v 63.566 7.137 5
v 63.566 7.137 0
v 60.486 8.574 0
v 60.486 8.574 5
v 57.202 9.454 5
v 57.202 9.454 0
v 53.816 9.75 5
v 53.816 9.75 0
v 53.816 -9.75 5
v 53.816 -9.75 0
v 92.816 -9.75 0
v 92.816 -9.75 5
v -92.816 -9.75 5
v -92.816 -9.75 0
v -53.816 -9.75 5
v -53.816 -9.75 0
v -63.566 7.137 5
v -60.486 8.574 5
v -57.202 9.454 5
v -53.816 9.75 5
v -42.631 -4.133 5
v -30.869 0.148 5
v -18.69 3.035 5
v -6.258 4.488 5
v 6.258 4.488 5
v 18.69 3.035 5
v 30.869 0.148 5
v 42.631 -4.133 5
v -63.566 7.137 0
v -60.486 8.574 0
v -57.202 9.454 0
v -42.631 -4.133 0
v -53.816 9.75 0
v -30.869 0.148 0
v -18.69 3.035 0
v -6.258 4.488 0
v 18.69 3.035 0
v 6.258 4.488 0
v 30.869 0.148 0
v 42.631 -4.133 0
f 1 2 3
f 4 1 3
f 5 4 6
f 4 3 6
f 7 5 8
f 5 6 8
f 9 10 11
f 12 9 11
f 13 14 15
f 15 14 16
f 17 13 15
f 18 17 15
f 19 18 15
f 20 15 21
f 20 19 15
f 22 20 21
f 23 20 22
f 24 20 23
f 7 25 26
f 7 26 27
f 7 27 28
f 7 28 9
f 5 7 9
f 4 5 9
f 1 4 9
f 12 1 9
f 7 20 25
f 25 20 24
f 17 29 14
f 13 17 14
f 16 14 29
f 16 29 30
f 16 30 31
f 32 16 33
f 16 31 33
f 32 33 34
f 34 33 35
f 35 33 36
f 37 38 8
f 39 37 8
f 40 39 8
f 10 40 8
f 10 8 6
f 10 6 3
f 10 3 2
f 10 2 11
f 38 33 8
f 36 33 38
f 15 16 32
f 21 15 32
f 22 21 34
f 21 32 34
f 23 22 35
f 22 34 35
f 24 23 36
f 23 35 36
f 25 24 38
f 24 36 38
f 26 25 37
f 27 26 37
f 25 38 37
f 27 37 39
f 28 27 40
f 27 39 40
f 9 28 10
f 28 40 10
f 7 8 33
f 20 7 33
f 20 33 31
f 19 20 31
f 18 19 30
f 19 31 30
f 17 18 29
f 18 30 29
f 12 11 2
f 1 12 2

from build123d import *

# Parameters (mm, degrees)
F1_DEPTH = 5


with BuildPart() as f1:
    # F0 (on Top) → F1 (new body)
    with BuildSketch(Plane.XY):
        Polygon((-92.8162193303, -9.75), (-53.8162193302, -9.75), (-63.5662193303, 7.1374953738), align=None)
        with BuildLine():
            Line((-63.5662193303, 7.1374953738), (-53.8162193303, -9.75))
            Line((-53.8162193303, -9.75), (-53.8162193303, 9.75))
            ThreePointArc((-53.8162193303, 9.75), (-58.8631907097, 9.0855536126), (-63.5662193303, 7.1374953738))
        make_face()
        with BuildLine():
            Line((-53.8162193303, 9.75), (-53.8162193303, -9.75))
            ThreePointArc((-53.8162193303, -9.75), (-53.3700027957, 0.0405892766), (-52.0350529909, 9.75))
            Line((-52.0350529909, 9.75), (-53.8162193303, 9.75))
        make_face()
        with BuildLine():
            ThreePointArc((-53.8162193302, -9.75), (0, 4.6700125092), (53.8162193302, -9.75))
            ThreePointArc((53.8162193303, -9.75), (53.3700027957, 0.0405892766), (52.0350529909, 9.75))
            Line((52.0350529909, 9.75), (-52.0350529909, 9.75))
            ThreePointArc((-52.0350529909, 9.75), (-53.3700027957, 0.0405892766), (-53.8162193303, -9.75))
        make_face()
        with BuildLine():
            ThreePointArc((52.0350529909, 9.75), (53.3700027957, 0.0405892766), (53.8162193303, -9.75))
            Line((53.8162193303, -9.75), (53.8162193303, 9.75))
            Line((53.8162193303, 9.75), (52.0350529909, 9.75))
        make_face()
        with BuildLine():
            Line((53.8162193303, 9.75), (53.8162193303, -9.75))
            Line((53.8162193303, -9.75), (63.5662193303, 7.1374953738))
            ThreePointArc((63.5662193303, 7.1374953738), (58.8631907097, 9.0855536126), (53.8162193303, 9.75))
        make_face()
        Polygon((63.5662193303, 7.1374953738), (53.8162193303, -9.75), (92.8162193303, -9.75), align=None)
    extrude(amount=F1_DEPTH)


solid = f1.part
